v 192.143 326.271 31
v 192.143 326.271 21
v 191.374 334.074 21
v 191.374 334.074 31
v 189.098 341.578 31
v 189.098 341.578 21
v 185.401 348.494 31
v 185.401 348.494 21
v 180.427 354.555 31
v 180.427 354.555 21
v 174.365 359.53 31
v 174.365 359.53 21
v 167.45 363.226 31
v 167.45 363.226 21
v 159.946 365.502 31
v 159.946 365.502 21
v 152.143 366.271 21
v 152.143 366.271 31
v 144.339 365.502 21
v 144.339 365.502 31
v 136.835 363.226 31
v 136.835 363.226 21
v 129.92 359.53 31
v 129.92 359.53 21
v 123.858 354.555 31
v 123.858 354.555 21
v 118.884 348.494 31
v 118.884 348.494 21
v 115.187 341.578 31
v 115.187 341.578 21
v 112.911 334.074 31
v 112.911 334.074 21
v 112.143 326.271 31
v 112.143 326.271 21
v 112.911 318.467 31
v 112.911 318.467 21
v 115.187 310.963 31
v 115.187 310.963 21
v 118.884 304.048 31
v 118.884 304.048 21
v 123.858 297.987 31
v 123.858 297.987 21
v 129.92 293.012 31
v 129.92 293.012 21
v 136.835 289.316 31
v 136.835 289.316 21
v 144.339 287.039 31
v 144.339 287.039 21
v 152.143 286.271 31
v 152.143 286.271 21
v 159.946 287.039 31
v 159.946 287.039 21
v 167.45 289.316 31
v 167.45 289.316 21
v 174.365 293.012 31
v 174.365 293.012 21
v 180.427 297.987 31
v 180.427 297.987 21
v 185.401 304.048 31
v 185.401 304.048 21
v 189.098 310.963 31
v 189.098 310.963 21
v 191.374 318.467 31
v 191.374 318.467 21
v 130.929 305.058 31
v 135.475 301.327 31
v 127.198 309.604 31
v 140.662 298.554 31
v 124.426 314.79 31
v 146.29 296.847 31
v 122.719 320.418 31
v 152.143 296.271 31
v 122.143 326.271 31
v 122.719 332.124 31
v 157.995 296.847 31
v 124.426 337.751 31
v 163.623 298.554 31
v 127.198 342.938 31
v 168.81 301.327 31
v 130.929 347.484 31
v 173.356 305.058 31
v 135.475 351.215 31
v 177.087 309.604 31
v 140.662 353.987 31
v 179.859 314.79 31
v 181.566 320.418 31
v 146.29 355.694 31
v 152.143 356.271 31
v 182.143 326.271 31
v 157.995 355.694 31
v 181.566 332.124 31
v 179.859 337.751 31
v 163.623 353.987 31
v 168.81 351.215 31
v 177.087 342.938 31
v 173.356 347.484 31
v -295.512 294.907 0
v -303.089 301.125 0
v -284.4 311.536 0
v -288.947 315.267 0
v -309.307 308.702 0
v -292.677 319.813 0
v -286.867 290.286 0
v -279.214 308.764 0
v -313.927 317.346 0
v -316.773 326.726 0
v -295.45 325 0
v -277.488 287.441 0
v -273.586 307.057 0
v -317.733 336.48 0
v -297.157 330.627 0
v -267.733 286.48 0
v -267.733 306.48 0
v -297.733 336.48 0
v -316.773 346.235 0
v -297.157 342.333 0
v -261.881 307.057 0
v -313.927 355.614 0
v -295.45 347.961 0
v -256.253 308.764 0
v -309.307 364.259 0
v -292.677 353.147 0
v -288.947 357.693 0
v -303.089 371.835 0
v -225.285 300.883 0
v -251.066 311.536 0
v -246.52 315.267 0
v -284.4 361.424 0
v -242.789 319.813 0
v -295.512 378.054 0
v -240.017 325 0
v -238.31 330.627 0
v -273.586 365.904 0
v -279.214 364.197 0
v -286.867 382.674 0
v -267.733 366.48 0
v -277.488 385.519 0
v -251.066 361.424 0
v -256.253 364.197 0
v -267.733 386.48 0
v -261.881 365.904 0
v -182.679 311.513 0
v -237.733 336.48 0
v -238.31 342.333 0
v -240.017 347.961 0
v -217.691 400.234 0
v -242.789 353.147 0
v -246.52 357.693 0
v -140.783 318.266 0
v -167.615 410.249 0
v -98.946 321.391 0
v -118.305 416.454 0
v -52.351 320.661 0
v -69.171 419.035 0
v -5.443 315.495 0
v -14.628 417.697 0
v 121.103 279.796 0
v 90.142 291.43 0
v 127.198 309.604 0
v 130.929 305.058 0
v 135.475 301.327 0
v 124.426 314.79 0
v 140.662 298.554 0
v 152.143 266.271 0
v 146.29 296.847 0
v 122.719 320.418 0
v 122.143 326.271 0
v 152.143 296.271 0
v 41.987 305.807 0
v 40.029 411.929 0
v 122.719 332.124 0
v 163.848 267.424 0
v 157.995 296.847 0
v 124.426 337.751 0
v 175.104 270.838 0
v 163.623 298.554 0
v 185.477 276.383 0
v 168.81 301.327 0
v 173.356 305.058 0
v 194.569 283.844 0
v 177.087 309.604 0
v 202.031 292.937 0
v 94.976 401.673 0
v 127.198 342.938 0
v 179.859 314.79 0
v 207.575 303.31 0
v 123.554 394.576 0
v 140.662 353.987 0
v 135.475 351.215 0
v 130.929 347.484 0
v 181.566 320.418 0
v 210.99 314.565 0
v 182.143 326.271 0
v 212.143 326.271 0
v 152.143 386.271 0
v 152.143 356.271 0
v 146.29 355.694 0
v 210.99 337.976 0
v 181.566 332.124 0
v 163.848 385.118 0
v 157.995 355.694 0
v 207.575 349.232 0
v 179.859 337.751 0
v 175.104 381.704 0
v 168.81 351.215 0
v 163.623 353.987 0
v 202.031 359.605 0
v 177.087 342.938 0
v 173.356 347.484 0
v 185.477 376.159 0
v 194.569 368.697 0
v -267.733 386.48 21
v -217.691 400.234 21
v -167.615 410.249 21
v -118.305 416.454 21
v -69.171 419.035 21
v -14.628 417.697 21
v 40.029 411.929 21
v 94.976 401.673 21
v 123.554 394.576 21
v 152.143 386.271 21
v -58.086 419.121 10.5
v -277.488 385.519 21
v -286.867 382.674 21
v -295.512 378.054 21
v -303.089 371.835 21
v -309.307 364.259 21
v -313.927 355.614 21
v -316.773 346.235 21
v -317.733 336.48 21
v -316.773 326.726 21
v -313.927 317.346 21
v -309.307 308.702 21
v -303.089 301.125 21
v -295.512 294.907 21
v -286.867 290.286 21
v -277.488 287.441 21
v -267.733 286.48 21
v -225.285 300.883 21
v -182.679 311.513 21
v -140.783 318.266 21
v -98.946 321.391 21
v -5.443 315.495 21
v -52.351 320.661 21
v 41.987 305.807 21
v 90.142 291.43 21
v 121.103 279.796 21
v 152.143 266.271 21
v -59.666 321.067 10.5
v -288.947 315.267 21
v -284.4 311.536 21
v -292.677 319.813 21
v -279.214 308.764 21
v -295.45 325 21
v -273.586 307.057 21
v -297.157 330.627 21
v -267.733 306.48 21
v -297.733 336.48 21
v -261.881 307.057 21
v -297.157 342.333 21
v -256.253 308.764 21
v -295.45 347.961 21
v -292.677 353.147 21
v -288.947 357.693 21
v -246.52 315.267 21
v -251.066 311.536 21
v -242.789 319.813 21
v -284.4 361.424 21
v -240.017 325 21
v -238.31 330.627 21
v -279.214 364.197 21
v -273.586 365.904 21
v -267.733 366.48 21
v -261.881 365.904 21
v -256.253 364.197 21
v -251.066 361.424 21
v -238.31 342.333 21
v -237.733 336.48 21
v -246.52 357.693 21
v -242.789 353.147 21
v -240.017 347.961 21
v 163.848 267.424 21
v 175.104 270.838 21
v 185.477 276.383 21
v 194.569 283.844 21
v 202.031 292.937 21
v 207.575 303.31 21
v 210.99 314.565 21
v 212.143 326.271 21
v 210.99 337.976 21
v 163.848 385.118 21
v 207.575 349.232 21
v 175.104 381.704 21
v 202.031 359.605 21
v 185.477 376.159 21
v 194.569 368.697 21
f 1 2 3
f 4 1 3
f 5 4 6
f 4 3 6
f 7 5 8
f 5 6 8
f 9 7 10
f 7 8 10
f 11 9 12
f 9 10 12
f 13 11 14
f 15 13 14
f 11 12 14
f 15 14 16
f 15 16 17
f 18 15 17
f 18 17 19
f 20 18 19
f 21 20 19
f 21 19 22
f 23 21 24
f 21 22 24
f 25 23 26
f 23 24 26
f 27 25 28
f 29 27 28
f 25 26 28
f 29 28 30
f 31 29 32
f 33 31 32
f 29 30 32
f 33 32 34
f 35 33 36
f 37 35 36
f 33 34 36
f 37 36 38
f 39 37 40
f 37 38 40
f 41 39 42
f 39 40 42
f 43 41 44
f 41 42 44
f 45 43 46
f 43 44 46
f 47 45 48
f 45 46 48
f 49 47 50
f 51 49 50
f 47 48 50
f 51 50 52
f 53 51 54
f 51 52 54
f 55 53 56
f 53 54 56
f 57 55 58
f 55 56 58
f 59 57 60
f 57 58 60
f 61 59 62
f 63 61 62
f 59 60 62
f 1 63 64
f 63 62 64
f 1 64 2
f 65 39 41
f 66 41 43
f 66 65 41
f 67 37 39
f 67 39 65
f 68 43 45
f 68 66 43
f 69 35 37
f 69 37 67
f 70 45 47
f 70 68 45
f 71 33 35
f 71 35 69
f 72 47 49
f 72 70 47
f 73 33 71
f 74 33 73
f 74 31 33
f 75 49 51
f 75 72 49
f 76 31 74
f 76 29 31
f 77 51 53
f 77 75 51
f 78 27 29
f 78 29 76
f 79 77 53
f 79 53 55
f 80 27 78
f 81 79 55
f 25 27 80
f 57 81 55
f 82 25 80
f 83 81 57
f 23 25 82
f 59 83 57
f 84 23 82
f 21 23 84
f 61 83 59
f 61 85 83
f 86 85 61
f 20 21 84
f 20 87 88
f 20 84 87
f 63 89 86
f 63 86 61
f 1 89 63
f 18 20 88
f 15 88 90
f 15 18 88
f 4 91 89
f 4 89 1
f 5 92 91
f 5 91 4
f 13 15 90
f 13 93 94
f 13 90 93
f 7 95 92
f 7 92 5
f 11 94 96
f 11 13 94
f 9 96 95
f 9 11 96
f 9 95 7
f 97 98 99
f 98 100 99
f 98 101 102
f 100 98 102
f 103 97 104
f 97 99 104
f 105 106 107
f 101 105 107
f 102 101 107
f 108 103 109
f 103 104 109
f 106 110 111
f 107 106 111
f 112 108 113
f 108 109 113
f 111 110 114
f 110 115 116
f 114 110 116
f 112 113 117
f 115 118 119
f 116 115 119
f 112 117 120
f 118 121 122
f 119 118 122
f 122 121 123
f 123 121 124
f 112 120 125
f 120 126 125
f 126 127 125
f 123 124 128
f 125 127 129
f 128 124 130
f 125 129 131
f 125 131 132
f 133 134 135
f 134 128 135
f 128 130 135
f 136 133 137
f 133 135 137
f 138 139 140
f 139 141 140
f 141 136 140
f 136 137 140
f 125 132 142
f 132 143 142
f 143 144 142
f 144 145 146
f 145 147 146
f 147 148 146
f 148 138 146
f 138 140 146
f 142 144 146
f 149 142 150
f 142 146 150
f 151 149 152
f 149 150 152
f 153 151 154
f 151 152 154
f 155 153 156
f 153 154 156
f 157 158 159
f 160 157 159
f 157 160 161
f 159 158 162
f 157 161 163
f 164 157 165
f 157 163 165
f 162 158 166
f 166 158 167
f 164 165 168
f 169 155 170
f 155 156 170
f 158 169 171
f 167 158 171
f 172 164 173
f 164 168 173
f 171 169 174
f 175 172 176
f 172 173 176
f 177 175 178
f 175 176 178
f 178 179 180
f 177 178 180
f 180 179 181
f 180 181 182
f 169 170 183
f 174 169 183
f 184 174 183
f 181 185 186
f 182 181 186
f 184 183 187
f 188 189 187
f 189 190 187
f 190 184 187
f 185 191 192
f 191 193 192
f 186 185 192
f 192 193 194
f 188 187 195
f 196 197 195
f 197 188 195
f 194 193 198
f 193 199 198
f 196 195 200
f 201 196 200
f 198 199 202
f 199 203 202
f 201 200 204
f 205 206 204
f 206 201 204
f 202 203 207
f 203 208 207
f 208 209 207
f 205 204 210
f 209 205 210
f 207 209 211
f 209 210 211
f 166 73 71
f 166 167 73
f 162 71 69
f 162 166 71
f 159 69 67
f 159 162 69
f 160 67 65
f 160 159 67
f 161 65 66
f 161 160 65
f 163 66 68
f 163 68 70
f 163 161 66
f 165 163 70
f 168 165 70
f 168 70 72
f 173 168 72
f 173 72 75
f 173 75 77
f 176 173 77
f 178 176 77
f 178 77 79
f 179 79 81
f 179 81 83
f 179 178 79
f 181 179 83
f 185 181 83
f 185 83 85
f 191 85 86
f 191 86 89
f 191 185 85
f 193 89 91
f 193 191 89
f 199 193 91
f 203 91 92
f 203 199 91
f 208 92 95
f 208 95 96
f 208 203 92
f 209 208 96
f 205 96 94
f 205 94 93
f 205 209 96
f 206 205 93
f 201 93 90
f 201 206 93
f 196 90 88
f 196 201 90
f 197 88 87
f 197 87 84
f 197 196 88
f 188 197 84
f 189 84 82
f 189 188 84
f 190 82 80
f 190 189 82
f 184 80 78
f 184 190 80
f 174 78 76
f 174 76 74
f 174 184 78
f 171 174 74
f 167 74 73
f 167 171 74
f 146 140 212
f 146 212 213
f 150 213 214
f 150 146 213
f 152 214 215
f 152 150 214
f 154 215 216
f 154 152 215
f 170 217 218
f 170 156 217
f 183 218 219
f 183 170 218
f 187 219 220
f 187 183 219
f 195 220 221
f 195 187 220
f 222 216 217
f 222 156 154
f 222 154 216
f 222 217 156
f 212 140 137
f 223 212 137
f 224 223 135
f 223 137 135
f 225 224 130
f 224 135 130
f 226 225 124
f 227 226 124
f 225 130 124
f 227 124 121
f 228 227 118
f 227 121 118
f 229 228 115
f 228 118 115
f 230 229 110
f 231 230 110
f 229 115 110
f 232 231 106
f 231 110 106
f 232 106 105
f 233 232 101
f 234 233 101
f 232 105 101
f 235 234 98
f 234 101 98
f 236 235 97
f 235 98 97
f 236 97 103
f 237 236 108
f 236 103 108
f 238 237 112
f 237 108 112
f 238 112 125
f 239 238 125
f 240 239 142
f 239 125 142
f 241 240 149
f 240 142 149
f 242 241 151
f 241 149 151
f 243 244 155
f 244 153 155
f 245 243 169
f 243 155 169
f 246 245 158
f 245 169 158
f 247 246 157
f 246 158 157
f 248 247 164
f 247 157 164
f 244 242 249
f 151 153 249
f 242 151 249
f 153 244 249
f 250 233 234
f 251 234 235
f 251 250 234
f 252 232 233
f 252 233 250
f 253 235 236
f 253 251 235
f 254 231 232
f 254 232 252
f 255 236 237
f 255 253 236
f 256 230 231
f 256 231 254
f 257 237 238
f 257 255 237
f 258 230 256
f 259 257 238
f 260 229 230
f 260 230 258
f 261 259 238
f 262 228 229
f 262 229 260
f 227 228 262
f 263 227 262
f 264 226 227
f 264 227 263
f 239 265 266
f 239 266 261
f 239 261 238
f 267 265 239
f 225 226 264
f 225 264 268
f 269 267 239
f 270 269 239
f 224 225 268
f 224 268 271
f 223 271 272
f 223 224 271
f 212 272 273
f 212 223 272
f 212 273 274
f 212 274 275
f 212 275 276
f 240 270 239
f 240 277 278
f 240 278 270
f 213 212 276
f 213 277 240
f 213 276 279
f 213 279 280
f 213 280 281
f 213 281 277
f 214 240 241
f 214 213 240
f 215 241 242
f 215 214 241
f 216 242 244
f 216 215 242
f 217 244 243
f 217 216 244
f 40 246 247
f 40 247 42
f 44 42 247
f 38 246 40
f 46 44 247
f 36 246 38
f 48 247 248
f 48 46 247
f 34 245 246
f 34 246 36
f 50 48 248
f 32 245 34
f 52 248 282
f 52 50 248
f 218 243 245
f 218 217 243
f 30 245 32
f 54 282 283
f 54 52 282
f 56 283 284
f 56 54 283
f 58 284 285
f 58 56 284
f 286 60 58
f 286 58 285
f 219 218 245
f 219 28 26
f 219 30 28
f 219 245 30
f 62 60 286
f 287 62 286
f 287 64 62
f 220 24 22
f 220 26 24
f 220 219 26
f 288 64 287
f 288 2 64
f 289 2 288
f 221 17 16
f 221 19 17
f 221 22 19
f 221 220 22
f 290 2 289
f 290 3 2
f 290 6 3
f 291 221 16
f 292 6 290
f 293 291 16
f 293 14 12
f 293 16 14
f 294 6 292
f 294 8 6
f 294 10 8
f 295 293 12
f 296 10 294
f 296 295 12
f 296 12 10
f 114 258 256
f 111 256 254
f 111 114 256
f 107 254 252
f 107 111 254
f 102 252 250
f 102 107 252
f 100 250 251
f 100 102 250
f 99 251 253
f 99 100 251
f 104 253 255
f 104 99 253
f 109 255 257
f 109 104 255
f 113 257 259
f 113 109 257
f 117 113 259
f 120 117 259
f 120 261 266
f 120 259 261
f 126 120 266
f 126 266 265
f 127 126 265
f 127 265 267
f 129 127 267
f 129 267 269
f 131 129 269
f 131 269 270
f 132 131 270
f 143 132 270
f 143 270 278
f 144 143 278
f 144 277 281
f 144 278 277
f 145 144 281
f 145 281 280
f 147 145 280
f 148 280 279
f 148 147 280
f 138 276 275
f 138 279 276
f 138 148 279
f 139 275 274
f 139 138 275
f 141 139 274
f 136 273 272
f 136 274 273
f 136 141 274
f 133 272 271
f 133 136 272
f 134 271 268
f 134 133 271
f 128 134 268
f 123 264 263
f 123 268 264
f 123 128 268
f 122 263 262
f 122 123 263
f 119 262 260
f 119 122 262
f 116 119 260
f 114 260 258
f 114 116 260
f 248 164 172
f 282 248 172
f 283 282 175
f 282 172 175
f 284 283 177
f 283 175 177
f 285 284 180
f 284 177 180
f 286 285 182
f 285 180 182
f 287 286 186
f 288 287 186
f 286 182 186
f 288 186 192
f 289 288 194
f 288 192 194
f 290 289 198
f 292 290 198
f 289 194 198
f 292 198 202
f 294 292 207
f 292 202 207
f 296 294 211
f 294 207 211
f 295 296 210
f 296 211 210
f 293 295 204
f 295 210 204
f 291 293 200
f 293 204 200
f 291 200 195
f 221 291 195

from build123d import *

# Parameters (mm, degrees)
BOSS_EXTRUDE1_DEPTH = 21
SKETCH2_R           = 30
CUT_EXTRUDE1_DEPTH  = 527.362693656
SKETCH4_R           = 40
SKETCH4_R_2         = 30
BOSS_EXTRUDE3_DEPTH = 10


with BuildPart() as part:
    # Sketch1 → Boss-Extrude1 (new body)
    with BuildSketch(Plane.XY):
        with BuildLine():
            add(Edge.make_bspline(
                [(-267.733324074, 386.480114093), (-58.376892778, 451.86591416), (152.142574227, 386.270803333)],
                knots=[0, 0, 0, 1, 1, 1], degree=2))
            ThreePointArc((-267.733324074, 386.480114093), (-317.733324074, 336.480114093), (-267.733324074, 286.480114093))
            add(Edge.make_bspline(
                [(-267.733324074, 286.480114093), (-61.536299878, 365.758634067), (152.142574227, 266.270803333)],
                knots=[0, 0, 0, 1, 1, 1], degree=2))
            ThreePointArc((152.142574227, 266.270803333), (212.142574227, 326.270803333), (152.142574227, 386.270803333))
        make_face()
    extrude(amount=BOSS_EXTRUDE1_DEPTH)

    # Sketch2 → Cut-Extrude1 (cut, through all)
    with BuildSketch(Plane.XY):
        with Locations((-267.733324074, 336.480114093)):
            Circle(SKETCH2_R)
        with Locations((152.142574227, 326.270803333)):
            Circle(SKETCH2_R)
    extrude(amount=CUT_EXTRUDE1_DEPTH, mode=Mode.SUBTRACT)

    # Sketch4 → Boss-Extrude3 (add)
    with BuildSketch(Plane.XY.offset(21)):
        with Locations((152.142574227, 326.270803333)):
            Circle(SKETCH4_R)
        with Locations((152.142574227, 326.270803333)):
            Circle(SKETCH4_R_2, mode=Mode.SUBTRACT)
    extrude(amount=BOSS_EXTRUDE3_DEPTH)


solid = part.part
